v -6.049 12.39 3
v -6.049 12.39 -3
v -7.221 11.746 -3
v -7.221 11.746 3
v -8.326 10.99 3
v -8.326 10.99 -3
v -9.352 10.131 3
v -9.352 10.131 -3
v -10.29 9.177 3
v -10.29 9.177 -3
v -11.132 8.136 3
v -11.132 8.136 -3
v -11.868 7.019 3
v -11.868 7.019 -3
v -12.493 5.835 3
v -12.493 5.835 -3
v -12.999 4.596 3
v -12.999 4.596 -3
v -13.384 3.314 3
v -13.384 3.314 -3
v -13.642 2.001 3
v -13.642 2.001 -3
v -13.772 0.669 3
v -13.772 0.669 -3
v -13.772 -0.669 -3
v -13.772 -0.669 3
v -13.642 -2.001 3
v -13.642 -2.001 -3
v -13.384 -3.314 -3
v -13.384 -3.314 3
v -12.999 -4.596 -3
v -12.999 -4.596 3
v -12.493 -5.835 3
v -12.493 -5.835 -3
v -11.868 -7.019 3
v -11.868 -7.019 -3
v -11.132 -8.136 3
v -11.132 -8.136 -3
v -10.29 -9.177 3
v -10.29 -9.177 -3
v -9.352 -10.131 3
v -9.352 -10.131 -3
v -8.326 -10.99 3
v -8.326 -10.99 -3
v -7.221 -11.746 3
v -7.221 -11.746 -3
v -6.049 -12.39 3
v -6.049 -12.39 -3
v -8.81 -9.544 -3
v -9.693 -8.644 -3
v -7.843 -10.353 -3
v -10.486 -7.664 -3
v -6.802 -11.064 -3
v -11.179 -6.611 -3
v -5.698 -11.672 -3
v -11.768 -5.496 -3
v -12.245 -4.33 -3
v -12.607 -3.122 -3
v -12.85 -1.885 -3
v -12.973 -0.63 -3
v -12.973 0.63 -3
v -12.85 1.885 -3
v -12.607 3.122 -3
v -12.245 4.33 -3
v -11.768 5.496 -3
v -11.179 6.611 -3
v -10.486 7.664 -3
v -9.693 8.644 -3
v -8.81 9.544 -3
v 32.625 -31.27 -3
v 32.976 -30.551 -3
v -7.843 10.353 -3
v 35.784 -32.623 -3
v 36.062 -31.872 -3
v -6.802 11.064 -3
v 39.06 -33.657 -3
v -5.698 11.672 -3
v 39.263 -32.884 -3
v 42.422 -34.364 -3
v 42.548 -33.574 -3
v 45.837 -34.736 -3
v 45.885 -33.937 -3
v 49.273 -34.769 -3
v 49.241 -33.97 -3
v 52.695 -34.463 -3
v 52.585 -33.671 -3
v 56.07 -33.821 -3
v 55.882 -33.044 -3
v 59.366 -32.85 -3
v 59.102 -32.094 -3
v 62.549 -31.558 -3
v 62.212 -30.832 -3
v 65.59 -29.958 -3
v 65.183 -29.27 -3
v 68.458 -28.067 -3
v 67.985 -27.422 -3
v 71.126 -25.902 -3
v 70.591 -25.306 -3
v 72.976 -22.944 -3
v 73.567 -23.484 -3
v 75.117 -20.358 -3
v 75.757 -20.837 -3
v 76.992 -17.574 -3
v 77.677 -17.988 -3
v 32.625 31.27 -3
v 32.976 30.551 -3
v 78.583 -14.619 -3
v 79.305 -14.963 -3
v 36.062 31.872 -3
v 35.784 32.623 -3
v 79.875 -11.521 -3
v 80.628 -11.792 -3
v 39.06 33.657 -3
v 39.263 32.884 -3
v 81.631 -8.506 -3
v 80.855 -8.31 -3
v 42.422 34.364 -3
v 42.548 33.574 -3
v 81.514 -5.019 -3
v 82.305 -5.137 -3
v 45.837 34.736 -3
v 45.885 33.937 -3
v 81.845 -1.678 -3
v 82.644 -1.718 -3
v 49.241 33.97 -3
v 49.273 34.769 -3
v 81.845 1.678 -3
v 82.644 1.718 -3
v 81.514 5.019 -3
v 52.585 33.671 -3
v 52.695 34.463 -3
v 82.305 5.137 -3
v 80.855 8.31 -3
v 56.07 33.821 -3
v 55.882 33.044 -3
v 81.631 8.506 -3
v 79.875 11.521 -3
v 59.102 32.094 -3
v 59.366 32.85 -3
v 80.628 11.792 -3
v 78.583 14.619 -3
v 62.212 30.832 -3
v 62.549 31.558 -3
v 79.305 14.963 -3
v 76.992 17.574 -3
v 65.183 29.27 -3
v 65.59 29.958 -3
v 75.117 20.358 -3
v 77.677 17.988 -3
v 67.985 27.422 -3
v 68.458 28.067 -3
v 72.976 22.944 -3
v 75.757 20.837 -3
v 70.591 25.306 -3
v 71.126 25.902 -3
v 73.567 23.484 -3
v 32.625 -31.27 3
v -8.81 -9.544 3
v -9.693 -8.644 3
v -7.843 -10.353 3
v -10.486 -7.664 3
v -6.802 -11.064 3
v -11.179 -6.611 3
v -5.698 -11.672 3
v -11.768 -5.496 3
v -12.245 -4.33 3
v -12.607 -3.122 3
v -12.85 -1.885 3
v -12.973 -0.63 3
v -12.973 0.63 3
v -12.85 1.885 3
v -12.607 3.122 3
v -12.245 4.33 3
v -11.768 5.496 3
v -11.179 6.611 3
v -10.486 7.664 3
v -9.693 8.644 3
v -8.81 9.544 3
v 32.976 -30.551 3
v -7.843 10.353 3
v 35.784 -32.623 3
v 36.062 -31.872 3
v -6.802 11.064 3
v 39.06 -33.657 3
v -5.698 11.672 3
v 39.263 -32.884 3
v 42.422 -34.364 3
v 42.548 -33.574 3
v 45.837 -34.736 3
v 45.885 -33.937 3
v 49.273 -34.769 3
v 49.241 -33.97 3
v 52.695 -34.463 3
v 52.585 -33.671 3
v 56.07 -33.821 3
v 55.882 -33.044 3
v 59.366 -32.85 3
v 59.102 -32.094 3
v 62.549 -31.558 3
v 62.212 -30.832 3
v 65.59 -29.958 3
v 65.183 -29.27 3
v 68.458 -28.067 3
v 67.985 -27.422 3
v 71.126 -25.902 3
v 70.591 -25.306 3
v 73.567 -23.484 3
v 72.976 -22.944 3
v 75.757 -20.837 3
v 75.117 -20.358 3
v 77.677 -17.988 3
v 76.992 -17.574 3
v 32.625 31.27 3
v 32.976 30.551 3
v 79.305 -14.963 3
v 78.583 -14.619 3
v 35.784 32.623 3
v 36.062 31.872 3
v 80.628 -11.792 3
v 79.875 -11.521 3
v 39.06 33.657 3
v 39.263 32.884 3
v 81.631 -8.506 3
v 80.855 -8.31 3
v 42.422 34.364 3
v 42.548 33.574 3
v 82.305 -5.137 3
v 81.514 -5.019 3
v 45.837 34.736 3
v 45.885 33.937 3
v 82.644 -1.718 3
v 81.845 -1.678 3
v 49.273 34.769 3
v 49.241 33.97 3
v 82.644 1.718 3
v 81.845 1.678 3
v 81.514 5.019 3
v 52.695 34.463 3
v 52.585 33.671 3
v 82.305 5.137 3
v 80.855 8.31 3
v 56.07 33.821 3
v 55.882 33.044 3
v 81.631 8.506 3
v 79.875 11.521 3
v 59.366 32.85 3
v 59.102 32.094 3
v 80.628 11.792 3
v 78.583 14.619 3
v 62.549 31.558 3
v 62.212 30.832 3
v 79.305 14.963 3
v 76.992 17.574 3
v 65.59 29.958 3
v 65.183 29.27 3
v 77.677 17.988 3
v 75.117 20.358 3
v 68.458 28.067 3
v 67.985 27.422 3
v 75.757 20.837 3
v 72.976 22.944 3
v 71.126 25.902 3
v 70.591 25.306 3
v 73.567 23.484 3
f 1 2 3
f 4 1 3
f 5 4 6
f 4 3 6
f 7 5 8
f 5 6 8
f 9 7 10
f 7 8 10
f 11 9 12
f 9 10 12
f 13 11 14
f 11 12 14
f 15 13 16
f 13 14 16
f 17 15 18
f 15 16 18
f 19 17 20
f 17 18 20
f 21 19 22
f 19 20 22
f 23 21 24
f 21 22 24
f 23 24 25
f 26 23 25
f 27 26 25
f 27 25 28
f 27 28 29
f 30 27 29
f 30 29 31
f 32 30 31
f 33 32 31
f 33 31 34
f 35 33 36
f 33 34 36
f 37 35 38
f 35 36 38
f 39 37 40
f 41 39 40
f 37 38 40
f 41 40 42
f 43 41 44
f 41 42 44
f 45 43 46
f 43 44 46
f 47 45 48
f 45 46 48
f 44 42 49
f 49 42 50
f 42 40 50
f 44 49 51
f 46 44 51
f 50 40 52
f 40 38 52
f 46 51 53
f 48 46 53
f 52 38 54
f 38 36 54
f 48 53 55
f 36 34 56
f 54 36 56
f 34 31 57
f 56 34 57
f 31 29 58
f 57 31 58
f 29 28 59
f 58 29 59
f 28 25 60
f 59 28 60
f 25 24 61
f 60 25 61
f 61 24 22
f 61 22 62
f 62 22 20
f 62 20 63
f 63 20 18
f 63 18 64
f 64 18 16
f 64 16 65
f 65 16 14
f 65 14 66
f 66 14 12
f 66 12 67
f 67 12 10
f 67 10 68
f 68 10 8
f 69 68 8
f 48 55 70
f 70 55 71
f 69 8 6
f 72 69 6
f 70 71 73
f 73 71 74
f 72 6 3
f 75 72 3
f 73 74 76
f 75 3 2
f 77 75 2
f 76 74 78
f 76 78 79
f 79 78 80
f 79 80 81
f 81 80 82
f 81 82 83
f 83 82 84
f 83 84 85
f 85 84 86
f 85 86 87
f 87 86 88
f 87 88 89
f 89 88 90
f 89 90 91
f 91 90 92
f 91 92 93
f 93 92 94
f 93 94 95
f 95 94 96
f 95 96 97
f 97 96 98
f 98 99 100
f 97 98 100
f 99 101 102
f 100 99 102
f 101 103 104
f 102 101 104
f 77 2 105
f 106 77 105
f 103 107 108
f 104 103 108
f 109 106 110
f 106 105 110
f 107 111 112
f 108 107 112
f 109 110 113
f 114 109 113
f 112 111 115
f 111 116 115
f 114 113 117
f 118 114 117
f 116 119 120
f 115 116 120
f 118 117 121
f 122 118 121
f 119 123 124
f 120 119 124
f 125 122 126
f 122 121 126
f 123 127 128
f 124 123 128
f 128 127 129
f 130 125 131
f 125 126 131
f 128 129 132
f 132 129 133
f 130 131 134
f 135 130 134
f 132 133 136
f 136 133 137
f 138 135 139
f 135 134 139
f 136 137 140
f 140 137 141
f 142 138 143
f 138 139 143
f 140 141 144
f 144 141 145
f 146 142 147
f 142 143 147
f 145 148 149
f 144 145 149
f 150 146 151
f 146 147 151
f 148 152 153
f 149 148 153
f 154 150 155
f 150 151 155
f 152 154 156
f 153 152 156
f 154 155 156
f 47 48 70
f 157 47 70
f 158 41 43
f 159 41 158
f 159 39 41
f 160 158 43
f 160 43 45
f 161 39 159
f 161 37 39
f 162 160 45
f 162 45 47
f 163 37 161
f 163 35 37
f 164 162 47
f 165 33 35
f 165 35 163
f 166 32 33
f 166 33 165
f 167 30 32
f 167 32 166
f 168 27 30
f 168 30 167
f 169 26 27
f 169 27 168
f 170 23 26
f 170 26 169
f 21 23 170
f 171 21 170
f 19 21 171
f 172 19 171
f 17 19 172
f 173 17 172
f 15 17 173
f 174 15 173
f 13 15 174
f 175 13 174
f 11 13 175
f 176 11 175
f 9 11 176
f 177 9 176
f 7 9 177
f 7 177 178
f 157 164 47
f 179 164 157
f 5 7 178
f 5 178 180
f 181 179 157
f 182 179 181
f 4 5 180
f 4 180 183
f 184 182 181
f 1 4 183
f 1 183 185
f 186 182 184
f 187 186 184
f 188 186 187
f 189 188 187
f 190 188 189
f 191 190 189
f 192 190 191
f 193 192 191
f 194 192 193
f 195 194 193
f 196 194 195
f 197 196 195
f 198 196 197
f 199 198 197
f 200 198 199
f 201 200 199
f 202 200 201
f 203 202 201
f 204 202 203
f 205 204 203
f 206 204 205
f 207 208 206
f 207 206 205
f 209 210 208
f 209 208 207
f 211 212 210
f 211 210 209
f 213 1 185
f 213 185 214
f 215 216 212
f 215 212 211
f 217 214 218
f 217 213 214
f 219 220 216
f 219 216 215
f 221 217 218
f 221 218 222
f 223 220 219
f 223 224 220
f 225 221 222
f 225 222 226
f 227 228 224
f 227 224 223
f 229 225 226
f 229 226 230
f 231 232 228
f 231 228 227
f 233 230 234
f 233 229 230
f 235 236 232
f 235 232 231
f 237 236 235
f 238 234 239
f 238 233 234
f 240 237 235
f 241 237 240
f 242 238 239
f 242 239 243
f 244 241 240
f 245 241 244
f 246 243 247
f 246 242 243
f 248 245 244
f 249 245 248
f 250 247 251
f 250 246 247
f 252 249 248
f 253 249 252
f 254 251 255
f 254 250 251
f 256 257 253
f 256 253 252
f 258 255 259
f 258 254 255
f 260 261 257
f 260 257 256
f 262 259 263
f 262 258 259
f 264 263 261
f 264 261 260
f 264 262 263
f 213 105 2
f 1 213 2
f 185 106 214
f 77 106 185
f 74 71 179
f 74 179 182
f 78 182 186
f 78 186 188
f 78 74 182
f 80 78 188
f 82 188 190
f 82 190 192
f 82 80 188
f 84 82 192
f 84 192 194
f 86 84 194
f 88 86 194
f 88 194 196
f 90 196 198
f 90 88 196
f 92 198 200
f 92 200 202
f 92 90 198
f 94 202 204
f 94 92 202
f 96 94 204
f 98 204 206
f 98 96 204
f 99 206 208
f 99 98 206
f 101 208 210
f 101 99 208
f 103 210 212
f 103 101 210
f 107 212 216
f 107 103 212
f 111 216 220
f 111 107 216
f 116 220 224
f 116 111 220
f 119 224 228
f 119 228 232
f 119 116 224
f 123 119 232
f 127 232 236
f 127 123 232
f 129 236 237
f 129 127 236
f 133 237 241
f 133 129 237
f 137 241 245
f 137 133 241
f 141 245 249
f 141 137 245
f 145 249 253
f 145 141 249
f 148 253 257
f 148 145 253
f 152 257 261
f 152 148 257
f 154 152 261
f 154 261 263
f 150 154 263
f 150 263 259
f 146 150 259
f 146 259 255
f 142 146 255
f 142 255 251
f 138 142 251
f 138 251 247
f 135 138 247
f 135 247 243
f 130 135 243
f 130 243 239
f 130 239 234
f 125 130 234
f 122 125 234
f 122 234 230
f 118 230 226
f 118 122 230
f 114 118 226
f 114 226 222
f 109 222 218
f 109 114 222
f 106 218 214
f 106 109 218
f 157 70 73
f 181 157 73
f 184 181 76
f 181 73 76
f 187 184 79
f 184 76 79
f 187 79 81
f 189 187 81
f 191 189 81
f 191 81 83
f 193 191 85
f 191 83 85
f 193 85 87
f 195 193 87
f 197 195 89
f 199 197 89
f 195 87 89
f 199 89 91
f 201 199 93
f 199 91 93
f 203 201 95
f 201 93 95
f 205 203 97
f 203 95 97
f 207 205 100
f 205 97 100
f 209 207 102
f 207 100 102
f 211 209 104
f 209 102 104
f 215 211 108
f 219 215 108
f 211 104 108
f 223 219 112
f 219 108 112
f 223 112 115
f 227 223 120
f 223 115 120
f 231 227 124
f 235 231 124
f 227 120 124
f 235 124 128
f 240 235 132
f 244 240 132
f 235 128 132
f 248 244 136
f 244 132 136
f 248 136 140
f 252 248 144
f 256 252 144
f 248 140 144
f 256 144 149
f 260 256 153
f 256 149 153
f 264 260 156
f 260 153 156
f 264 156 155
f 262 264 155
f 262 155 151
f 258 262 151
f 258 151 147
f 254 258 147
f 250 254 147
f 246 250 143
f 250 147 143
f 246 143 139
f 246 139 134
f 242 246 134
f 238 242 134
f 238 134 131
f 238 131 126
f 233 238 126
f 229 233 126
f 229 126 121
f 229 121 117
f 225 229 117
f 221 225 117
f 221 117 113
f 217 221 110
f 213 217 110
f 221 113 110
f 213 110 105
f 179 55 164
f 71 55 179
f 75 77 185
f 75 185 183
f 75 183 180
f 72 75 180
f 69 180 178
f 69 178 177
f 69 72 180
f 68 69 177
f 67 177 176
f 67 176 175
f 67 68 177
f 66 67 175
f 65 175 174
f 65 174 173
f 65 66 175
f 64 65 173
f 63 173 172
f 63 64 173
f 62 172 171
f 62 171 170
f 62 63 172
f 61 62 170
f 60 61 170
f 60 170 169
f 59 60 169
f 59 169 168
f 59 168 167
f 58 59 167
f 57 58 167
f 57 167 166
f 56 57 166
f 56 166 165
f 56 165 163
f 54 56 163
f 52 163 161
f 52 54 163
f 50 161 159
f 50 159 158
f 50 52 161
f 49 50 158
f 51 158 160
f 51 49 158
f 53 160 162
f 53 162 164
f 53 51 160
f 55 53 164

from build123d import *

# Parameters (mm, degrees)
EXTRUDE_1_DEPTH      = 3
EXTRUDE_1_DEPTH_BACK = 3


with BuildPart() as part:
    # 草图1 → 凸台-拉伸1 (new, two sides: drawn at the far end of the back side and taken through both)
    with BuildSketch(Plane.XY.offset(-EXTRUDE_1_DEPTH_BACK)):
        with BuildLine():
            Line((-6.048545797, -12.390498432), (32.625436737, -31.269590002))
            ThreePointArc((32.625436737, -31.269590002), (82.6864675, 0), (32.625436737, 31.269590002))
            Line((32.625436737, 31.269590002), (-6.048545797, 12.390498432))
            ThreePointArc((-6.048545797, 12.390498432), (-13.788015, 0), (-6.048545797, -12.390498432))
        make_face()
        with BuildLine():
            Line((-5.697600672, -11.671584306), (32.976381862, -30.550675876))
            ThreePointArc((32.976381862, -30.550675876), (81.8864675, 0), (32.976381862, 30.550675876))
            Line((32.976381862, 30.550675876), (-5.697600672, 11.671584306))
            ThreePointArc((-5.697600672, 11.671584306), (-12.988015, 0), (-5.697600672, -11.671584306))
        make_face(mode=Mode.SUBTRACT)
    extrude(amount=EXTRUDE_1_DEPTH + EXTRUDE_1_DEPTH_BACK)


solid = part.part
